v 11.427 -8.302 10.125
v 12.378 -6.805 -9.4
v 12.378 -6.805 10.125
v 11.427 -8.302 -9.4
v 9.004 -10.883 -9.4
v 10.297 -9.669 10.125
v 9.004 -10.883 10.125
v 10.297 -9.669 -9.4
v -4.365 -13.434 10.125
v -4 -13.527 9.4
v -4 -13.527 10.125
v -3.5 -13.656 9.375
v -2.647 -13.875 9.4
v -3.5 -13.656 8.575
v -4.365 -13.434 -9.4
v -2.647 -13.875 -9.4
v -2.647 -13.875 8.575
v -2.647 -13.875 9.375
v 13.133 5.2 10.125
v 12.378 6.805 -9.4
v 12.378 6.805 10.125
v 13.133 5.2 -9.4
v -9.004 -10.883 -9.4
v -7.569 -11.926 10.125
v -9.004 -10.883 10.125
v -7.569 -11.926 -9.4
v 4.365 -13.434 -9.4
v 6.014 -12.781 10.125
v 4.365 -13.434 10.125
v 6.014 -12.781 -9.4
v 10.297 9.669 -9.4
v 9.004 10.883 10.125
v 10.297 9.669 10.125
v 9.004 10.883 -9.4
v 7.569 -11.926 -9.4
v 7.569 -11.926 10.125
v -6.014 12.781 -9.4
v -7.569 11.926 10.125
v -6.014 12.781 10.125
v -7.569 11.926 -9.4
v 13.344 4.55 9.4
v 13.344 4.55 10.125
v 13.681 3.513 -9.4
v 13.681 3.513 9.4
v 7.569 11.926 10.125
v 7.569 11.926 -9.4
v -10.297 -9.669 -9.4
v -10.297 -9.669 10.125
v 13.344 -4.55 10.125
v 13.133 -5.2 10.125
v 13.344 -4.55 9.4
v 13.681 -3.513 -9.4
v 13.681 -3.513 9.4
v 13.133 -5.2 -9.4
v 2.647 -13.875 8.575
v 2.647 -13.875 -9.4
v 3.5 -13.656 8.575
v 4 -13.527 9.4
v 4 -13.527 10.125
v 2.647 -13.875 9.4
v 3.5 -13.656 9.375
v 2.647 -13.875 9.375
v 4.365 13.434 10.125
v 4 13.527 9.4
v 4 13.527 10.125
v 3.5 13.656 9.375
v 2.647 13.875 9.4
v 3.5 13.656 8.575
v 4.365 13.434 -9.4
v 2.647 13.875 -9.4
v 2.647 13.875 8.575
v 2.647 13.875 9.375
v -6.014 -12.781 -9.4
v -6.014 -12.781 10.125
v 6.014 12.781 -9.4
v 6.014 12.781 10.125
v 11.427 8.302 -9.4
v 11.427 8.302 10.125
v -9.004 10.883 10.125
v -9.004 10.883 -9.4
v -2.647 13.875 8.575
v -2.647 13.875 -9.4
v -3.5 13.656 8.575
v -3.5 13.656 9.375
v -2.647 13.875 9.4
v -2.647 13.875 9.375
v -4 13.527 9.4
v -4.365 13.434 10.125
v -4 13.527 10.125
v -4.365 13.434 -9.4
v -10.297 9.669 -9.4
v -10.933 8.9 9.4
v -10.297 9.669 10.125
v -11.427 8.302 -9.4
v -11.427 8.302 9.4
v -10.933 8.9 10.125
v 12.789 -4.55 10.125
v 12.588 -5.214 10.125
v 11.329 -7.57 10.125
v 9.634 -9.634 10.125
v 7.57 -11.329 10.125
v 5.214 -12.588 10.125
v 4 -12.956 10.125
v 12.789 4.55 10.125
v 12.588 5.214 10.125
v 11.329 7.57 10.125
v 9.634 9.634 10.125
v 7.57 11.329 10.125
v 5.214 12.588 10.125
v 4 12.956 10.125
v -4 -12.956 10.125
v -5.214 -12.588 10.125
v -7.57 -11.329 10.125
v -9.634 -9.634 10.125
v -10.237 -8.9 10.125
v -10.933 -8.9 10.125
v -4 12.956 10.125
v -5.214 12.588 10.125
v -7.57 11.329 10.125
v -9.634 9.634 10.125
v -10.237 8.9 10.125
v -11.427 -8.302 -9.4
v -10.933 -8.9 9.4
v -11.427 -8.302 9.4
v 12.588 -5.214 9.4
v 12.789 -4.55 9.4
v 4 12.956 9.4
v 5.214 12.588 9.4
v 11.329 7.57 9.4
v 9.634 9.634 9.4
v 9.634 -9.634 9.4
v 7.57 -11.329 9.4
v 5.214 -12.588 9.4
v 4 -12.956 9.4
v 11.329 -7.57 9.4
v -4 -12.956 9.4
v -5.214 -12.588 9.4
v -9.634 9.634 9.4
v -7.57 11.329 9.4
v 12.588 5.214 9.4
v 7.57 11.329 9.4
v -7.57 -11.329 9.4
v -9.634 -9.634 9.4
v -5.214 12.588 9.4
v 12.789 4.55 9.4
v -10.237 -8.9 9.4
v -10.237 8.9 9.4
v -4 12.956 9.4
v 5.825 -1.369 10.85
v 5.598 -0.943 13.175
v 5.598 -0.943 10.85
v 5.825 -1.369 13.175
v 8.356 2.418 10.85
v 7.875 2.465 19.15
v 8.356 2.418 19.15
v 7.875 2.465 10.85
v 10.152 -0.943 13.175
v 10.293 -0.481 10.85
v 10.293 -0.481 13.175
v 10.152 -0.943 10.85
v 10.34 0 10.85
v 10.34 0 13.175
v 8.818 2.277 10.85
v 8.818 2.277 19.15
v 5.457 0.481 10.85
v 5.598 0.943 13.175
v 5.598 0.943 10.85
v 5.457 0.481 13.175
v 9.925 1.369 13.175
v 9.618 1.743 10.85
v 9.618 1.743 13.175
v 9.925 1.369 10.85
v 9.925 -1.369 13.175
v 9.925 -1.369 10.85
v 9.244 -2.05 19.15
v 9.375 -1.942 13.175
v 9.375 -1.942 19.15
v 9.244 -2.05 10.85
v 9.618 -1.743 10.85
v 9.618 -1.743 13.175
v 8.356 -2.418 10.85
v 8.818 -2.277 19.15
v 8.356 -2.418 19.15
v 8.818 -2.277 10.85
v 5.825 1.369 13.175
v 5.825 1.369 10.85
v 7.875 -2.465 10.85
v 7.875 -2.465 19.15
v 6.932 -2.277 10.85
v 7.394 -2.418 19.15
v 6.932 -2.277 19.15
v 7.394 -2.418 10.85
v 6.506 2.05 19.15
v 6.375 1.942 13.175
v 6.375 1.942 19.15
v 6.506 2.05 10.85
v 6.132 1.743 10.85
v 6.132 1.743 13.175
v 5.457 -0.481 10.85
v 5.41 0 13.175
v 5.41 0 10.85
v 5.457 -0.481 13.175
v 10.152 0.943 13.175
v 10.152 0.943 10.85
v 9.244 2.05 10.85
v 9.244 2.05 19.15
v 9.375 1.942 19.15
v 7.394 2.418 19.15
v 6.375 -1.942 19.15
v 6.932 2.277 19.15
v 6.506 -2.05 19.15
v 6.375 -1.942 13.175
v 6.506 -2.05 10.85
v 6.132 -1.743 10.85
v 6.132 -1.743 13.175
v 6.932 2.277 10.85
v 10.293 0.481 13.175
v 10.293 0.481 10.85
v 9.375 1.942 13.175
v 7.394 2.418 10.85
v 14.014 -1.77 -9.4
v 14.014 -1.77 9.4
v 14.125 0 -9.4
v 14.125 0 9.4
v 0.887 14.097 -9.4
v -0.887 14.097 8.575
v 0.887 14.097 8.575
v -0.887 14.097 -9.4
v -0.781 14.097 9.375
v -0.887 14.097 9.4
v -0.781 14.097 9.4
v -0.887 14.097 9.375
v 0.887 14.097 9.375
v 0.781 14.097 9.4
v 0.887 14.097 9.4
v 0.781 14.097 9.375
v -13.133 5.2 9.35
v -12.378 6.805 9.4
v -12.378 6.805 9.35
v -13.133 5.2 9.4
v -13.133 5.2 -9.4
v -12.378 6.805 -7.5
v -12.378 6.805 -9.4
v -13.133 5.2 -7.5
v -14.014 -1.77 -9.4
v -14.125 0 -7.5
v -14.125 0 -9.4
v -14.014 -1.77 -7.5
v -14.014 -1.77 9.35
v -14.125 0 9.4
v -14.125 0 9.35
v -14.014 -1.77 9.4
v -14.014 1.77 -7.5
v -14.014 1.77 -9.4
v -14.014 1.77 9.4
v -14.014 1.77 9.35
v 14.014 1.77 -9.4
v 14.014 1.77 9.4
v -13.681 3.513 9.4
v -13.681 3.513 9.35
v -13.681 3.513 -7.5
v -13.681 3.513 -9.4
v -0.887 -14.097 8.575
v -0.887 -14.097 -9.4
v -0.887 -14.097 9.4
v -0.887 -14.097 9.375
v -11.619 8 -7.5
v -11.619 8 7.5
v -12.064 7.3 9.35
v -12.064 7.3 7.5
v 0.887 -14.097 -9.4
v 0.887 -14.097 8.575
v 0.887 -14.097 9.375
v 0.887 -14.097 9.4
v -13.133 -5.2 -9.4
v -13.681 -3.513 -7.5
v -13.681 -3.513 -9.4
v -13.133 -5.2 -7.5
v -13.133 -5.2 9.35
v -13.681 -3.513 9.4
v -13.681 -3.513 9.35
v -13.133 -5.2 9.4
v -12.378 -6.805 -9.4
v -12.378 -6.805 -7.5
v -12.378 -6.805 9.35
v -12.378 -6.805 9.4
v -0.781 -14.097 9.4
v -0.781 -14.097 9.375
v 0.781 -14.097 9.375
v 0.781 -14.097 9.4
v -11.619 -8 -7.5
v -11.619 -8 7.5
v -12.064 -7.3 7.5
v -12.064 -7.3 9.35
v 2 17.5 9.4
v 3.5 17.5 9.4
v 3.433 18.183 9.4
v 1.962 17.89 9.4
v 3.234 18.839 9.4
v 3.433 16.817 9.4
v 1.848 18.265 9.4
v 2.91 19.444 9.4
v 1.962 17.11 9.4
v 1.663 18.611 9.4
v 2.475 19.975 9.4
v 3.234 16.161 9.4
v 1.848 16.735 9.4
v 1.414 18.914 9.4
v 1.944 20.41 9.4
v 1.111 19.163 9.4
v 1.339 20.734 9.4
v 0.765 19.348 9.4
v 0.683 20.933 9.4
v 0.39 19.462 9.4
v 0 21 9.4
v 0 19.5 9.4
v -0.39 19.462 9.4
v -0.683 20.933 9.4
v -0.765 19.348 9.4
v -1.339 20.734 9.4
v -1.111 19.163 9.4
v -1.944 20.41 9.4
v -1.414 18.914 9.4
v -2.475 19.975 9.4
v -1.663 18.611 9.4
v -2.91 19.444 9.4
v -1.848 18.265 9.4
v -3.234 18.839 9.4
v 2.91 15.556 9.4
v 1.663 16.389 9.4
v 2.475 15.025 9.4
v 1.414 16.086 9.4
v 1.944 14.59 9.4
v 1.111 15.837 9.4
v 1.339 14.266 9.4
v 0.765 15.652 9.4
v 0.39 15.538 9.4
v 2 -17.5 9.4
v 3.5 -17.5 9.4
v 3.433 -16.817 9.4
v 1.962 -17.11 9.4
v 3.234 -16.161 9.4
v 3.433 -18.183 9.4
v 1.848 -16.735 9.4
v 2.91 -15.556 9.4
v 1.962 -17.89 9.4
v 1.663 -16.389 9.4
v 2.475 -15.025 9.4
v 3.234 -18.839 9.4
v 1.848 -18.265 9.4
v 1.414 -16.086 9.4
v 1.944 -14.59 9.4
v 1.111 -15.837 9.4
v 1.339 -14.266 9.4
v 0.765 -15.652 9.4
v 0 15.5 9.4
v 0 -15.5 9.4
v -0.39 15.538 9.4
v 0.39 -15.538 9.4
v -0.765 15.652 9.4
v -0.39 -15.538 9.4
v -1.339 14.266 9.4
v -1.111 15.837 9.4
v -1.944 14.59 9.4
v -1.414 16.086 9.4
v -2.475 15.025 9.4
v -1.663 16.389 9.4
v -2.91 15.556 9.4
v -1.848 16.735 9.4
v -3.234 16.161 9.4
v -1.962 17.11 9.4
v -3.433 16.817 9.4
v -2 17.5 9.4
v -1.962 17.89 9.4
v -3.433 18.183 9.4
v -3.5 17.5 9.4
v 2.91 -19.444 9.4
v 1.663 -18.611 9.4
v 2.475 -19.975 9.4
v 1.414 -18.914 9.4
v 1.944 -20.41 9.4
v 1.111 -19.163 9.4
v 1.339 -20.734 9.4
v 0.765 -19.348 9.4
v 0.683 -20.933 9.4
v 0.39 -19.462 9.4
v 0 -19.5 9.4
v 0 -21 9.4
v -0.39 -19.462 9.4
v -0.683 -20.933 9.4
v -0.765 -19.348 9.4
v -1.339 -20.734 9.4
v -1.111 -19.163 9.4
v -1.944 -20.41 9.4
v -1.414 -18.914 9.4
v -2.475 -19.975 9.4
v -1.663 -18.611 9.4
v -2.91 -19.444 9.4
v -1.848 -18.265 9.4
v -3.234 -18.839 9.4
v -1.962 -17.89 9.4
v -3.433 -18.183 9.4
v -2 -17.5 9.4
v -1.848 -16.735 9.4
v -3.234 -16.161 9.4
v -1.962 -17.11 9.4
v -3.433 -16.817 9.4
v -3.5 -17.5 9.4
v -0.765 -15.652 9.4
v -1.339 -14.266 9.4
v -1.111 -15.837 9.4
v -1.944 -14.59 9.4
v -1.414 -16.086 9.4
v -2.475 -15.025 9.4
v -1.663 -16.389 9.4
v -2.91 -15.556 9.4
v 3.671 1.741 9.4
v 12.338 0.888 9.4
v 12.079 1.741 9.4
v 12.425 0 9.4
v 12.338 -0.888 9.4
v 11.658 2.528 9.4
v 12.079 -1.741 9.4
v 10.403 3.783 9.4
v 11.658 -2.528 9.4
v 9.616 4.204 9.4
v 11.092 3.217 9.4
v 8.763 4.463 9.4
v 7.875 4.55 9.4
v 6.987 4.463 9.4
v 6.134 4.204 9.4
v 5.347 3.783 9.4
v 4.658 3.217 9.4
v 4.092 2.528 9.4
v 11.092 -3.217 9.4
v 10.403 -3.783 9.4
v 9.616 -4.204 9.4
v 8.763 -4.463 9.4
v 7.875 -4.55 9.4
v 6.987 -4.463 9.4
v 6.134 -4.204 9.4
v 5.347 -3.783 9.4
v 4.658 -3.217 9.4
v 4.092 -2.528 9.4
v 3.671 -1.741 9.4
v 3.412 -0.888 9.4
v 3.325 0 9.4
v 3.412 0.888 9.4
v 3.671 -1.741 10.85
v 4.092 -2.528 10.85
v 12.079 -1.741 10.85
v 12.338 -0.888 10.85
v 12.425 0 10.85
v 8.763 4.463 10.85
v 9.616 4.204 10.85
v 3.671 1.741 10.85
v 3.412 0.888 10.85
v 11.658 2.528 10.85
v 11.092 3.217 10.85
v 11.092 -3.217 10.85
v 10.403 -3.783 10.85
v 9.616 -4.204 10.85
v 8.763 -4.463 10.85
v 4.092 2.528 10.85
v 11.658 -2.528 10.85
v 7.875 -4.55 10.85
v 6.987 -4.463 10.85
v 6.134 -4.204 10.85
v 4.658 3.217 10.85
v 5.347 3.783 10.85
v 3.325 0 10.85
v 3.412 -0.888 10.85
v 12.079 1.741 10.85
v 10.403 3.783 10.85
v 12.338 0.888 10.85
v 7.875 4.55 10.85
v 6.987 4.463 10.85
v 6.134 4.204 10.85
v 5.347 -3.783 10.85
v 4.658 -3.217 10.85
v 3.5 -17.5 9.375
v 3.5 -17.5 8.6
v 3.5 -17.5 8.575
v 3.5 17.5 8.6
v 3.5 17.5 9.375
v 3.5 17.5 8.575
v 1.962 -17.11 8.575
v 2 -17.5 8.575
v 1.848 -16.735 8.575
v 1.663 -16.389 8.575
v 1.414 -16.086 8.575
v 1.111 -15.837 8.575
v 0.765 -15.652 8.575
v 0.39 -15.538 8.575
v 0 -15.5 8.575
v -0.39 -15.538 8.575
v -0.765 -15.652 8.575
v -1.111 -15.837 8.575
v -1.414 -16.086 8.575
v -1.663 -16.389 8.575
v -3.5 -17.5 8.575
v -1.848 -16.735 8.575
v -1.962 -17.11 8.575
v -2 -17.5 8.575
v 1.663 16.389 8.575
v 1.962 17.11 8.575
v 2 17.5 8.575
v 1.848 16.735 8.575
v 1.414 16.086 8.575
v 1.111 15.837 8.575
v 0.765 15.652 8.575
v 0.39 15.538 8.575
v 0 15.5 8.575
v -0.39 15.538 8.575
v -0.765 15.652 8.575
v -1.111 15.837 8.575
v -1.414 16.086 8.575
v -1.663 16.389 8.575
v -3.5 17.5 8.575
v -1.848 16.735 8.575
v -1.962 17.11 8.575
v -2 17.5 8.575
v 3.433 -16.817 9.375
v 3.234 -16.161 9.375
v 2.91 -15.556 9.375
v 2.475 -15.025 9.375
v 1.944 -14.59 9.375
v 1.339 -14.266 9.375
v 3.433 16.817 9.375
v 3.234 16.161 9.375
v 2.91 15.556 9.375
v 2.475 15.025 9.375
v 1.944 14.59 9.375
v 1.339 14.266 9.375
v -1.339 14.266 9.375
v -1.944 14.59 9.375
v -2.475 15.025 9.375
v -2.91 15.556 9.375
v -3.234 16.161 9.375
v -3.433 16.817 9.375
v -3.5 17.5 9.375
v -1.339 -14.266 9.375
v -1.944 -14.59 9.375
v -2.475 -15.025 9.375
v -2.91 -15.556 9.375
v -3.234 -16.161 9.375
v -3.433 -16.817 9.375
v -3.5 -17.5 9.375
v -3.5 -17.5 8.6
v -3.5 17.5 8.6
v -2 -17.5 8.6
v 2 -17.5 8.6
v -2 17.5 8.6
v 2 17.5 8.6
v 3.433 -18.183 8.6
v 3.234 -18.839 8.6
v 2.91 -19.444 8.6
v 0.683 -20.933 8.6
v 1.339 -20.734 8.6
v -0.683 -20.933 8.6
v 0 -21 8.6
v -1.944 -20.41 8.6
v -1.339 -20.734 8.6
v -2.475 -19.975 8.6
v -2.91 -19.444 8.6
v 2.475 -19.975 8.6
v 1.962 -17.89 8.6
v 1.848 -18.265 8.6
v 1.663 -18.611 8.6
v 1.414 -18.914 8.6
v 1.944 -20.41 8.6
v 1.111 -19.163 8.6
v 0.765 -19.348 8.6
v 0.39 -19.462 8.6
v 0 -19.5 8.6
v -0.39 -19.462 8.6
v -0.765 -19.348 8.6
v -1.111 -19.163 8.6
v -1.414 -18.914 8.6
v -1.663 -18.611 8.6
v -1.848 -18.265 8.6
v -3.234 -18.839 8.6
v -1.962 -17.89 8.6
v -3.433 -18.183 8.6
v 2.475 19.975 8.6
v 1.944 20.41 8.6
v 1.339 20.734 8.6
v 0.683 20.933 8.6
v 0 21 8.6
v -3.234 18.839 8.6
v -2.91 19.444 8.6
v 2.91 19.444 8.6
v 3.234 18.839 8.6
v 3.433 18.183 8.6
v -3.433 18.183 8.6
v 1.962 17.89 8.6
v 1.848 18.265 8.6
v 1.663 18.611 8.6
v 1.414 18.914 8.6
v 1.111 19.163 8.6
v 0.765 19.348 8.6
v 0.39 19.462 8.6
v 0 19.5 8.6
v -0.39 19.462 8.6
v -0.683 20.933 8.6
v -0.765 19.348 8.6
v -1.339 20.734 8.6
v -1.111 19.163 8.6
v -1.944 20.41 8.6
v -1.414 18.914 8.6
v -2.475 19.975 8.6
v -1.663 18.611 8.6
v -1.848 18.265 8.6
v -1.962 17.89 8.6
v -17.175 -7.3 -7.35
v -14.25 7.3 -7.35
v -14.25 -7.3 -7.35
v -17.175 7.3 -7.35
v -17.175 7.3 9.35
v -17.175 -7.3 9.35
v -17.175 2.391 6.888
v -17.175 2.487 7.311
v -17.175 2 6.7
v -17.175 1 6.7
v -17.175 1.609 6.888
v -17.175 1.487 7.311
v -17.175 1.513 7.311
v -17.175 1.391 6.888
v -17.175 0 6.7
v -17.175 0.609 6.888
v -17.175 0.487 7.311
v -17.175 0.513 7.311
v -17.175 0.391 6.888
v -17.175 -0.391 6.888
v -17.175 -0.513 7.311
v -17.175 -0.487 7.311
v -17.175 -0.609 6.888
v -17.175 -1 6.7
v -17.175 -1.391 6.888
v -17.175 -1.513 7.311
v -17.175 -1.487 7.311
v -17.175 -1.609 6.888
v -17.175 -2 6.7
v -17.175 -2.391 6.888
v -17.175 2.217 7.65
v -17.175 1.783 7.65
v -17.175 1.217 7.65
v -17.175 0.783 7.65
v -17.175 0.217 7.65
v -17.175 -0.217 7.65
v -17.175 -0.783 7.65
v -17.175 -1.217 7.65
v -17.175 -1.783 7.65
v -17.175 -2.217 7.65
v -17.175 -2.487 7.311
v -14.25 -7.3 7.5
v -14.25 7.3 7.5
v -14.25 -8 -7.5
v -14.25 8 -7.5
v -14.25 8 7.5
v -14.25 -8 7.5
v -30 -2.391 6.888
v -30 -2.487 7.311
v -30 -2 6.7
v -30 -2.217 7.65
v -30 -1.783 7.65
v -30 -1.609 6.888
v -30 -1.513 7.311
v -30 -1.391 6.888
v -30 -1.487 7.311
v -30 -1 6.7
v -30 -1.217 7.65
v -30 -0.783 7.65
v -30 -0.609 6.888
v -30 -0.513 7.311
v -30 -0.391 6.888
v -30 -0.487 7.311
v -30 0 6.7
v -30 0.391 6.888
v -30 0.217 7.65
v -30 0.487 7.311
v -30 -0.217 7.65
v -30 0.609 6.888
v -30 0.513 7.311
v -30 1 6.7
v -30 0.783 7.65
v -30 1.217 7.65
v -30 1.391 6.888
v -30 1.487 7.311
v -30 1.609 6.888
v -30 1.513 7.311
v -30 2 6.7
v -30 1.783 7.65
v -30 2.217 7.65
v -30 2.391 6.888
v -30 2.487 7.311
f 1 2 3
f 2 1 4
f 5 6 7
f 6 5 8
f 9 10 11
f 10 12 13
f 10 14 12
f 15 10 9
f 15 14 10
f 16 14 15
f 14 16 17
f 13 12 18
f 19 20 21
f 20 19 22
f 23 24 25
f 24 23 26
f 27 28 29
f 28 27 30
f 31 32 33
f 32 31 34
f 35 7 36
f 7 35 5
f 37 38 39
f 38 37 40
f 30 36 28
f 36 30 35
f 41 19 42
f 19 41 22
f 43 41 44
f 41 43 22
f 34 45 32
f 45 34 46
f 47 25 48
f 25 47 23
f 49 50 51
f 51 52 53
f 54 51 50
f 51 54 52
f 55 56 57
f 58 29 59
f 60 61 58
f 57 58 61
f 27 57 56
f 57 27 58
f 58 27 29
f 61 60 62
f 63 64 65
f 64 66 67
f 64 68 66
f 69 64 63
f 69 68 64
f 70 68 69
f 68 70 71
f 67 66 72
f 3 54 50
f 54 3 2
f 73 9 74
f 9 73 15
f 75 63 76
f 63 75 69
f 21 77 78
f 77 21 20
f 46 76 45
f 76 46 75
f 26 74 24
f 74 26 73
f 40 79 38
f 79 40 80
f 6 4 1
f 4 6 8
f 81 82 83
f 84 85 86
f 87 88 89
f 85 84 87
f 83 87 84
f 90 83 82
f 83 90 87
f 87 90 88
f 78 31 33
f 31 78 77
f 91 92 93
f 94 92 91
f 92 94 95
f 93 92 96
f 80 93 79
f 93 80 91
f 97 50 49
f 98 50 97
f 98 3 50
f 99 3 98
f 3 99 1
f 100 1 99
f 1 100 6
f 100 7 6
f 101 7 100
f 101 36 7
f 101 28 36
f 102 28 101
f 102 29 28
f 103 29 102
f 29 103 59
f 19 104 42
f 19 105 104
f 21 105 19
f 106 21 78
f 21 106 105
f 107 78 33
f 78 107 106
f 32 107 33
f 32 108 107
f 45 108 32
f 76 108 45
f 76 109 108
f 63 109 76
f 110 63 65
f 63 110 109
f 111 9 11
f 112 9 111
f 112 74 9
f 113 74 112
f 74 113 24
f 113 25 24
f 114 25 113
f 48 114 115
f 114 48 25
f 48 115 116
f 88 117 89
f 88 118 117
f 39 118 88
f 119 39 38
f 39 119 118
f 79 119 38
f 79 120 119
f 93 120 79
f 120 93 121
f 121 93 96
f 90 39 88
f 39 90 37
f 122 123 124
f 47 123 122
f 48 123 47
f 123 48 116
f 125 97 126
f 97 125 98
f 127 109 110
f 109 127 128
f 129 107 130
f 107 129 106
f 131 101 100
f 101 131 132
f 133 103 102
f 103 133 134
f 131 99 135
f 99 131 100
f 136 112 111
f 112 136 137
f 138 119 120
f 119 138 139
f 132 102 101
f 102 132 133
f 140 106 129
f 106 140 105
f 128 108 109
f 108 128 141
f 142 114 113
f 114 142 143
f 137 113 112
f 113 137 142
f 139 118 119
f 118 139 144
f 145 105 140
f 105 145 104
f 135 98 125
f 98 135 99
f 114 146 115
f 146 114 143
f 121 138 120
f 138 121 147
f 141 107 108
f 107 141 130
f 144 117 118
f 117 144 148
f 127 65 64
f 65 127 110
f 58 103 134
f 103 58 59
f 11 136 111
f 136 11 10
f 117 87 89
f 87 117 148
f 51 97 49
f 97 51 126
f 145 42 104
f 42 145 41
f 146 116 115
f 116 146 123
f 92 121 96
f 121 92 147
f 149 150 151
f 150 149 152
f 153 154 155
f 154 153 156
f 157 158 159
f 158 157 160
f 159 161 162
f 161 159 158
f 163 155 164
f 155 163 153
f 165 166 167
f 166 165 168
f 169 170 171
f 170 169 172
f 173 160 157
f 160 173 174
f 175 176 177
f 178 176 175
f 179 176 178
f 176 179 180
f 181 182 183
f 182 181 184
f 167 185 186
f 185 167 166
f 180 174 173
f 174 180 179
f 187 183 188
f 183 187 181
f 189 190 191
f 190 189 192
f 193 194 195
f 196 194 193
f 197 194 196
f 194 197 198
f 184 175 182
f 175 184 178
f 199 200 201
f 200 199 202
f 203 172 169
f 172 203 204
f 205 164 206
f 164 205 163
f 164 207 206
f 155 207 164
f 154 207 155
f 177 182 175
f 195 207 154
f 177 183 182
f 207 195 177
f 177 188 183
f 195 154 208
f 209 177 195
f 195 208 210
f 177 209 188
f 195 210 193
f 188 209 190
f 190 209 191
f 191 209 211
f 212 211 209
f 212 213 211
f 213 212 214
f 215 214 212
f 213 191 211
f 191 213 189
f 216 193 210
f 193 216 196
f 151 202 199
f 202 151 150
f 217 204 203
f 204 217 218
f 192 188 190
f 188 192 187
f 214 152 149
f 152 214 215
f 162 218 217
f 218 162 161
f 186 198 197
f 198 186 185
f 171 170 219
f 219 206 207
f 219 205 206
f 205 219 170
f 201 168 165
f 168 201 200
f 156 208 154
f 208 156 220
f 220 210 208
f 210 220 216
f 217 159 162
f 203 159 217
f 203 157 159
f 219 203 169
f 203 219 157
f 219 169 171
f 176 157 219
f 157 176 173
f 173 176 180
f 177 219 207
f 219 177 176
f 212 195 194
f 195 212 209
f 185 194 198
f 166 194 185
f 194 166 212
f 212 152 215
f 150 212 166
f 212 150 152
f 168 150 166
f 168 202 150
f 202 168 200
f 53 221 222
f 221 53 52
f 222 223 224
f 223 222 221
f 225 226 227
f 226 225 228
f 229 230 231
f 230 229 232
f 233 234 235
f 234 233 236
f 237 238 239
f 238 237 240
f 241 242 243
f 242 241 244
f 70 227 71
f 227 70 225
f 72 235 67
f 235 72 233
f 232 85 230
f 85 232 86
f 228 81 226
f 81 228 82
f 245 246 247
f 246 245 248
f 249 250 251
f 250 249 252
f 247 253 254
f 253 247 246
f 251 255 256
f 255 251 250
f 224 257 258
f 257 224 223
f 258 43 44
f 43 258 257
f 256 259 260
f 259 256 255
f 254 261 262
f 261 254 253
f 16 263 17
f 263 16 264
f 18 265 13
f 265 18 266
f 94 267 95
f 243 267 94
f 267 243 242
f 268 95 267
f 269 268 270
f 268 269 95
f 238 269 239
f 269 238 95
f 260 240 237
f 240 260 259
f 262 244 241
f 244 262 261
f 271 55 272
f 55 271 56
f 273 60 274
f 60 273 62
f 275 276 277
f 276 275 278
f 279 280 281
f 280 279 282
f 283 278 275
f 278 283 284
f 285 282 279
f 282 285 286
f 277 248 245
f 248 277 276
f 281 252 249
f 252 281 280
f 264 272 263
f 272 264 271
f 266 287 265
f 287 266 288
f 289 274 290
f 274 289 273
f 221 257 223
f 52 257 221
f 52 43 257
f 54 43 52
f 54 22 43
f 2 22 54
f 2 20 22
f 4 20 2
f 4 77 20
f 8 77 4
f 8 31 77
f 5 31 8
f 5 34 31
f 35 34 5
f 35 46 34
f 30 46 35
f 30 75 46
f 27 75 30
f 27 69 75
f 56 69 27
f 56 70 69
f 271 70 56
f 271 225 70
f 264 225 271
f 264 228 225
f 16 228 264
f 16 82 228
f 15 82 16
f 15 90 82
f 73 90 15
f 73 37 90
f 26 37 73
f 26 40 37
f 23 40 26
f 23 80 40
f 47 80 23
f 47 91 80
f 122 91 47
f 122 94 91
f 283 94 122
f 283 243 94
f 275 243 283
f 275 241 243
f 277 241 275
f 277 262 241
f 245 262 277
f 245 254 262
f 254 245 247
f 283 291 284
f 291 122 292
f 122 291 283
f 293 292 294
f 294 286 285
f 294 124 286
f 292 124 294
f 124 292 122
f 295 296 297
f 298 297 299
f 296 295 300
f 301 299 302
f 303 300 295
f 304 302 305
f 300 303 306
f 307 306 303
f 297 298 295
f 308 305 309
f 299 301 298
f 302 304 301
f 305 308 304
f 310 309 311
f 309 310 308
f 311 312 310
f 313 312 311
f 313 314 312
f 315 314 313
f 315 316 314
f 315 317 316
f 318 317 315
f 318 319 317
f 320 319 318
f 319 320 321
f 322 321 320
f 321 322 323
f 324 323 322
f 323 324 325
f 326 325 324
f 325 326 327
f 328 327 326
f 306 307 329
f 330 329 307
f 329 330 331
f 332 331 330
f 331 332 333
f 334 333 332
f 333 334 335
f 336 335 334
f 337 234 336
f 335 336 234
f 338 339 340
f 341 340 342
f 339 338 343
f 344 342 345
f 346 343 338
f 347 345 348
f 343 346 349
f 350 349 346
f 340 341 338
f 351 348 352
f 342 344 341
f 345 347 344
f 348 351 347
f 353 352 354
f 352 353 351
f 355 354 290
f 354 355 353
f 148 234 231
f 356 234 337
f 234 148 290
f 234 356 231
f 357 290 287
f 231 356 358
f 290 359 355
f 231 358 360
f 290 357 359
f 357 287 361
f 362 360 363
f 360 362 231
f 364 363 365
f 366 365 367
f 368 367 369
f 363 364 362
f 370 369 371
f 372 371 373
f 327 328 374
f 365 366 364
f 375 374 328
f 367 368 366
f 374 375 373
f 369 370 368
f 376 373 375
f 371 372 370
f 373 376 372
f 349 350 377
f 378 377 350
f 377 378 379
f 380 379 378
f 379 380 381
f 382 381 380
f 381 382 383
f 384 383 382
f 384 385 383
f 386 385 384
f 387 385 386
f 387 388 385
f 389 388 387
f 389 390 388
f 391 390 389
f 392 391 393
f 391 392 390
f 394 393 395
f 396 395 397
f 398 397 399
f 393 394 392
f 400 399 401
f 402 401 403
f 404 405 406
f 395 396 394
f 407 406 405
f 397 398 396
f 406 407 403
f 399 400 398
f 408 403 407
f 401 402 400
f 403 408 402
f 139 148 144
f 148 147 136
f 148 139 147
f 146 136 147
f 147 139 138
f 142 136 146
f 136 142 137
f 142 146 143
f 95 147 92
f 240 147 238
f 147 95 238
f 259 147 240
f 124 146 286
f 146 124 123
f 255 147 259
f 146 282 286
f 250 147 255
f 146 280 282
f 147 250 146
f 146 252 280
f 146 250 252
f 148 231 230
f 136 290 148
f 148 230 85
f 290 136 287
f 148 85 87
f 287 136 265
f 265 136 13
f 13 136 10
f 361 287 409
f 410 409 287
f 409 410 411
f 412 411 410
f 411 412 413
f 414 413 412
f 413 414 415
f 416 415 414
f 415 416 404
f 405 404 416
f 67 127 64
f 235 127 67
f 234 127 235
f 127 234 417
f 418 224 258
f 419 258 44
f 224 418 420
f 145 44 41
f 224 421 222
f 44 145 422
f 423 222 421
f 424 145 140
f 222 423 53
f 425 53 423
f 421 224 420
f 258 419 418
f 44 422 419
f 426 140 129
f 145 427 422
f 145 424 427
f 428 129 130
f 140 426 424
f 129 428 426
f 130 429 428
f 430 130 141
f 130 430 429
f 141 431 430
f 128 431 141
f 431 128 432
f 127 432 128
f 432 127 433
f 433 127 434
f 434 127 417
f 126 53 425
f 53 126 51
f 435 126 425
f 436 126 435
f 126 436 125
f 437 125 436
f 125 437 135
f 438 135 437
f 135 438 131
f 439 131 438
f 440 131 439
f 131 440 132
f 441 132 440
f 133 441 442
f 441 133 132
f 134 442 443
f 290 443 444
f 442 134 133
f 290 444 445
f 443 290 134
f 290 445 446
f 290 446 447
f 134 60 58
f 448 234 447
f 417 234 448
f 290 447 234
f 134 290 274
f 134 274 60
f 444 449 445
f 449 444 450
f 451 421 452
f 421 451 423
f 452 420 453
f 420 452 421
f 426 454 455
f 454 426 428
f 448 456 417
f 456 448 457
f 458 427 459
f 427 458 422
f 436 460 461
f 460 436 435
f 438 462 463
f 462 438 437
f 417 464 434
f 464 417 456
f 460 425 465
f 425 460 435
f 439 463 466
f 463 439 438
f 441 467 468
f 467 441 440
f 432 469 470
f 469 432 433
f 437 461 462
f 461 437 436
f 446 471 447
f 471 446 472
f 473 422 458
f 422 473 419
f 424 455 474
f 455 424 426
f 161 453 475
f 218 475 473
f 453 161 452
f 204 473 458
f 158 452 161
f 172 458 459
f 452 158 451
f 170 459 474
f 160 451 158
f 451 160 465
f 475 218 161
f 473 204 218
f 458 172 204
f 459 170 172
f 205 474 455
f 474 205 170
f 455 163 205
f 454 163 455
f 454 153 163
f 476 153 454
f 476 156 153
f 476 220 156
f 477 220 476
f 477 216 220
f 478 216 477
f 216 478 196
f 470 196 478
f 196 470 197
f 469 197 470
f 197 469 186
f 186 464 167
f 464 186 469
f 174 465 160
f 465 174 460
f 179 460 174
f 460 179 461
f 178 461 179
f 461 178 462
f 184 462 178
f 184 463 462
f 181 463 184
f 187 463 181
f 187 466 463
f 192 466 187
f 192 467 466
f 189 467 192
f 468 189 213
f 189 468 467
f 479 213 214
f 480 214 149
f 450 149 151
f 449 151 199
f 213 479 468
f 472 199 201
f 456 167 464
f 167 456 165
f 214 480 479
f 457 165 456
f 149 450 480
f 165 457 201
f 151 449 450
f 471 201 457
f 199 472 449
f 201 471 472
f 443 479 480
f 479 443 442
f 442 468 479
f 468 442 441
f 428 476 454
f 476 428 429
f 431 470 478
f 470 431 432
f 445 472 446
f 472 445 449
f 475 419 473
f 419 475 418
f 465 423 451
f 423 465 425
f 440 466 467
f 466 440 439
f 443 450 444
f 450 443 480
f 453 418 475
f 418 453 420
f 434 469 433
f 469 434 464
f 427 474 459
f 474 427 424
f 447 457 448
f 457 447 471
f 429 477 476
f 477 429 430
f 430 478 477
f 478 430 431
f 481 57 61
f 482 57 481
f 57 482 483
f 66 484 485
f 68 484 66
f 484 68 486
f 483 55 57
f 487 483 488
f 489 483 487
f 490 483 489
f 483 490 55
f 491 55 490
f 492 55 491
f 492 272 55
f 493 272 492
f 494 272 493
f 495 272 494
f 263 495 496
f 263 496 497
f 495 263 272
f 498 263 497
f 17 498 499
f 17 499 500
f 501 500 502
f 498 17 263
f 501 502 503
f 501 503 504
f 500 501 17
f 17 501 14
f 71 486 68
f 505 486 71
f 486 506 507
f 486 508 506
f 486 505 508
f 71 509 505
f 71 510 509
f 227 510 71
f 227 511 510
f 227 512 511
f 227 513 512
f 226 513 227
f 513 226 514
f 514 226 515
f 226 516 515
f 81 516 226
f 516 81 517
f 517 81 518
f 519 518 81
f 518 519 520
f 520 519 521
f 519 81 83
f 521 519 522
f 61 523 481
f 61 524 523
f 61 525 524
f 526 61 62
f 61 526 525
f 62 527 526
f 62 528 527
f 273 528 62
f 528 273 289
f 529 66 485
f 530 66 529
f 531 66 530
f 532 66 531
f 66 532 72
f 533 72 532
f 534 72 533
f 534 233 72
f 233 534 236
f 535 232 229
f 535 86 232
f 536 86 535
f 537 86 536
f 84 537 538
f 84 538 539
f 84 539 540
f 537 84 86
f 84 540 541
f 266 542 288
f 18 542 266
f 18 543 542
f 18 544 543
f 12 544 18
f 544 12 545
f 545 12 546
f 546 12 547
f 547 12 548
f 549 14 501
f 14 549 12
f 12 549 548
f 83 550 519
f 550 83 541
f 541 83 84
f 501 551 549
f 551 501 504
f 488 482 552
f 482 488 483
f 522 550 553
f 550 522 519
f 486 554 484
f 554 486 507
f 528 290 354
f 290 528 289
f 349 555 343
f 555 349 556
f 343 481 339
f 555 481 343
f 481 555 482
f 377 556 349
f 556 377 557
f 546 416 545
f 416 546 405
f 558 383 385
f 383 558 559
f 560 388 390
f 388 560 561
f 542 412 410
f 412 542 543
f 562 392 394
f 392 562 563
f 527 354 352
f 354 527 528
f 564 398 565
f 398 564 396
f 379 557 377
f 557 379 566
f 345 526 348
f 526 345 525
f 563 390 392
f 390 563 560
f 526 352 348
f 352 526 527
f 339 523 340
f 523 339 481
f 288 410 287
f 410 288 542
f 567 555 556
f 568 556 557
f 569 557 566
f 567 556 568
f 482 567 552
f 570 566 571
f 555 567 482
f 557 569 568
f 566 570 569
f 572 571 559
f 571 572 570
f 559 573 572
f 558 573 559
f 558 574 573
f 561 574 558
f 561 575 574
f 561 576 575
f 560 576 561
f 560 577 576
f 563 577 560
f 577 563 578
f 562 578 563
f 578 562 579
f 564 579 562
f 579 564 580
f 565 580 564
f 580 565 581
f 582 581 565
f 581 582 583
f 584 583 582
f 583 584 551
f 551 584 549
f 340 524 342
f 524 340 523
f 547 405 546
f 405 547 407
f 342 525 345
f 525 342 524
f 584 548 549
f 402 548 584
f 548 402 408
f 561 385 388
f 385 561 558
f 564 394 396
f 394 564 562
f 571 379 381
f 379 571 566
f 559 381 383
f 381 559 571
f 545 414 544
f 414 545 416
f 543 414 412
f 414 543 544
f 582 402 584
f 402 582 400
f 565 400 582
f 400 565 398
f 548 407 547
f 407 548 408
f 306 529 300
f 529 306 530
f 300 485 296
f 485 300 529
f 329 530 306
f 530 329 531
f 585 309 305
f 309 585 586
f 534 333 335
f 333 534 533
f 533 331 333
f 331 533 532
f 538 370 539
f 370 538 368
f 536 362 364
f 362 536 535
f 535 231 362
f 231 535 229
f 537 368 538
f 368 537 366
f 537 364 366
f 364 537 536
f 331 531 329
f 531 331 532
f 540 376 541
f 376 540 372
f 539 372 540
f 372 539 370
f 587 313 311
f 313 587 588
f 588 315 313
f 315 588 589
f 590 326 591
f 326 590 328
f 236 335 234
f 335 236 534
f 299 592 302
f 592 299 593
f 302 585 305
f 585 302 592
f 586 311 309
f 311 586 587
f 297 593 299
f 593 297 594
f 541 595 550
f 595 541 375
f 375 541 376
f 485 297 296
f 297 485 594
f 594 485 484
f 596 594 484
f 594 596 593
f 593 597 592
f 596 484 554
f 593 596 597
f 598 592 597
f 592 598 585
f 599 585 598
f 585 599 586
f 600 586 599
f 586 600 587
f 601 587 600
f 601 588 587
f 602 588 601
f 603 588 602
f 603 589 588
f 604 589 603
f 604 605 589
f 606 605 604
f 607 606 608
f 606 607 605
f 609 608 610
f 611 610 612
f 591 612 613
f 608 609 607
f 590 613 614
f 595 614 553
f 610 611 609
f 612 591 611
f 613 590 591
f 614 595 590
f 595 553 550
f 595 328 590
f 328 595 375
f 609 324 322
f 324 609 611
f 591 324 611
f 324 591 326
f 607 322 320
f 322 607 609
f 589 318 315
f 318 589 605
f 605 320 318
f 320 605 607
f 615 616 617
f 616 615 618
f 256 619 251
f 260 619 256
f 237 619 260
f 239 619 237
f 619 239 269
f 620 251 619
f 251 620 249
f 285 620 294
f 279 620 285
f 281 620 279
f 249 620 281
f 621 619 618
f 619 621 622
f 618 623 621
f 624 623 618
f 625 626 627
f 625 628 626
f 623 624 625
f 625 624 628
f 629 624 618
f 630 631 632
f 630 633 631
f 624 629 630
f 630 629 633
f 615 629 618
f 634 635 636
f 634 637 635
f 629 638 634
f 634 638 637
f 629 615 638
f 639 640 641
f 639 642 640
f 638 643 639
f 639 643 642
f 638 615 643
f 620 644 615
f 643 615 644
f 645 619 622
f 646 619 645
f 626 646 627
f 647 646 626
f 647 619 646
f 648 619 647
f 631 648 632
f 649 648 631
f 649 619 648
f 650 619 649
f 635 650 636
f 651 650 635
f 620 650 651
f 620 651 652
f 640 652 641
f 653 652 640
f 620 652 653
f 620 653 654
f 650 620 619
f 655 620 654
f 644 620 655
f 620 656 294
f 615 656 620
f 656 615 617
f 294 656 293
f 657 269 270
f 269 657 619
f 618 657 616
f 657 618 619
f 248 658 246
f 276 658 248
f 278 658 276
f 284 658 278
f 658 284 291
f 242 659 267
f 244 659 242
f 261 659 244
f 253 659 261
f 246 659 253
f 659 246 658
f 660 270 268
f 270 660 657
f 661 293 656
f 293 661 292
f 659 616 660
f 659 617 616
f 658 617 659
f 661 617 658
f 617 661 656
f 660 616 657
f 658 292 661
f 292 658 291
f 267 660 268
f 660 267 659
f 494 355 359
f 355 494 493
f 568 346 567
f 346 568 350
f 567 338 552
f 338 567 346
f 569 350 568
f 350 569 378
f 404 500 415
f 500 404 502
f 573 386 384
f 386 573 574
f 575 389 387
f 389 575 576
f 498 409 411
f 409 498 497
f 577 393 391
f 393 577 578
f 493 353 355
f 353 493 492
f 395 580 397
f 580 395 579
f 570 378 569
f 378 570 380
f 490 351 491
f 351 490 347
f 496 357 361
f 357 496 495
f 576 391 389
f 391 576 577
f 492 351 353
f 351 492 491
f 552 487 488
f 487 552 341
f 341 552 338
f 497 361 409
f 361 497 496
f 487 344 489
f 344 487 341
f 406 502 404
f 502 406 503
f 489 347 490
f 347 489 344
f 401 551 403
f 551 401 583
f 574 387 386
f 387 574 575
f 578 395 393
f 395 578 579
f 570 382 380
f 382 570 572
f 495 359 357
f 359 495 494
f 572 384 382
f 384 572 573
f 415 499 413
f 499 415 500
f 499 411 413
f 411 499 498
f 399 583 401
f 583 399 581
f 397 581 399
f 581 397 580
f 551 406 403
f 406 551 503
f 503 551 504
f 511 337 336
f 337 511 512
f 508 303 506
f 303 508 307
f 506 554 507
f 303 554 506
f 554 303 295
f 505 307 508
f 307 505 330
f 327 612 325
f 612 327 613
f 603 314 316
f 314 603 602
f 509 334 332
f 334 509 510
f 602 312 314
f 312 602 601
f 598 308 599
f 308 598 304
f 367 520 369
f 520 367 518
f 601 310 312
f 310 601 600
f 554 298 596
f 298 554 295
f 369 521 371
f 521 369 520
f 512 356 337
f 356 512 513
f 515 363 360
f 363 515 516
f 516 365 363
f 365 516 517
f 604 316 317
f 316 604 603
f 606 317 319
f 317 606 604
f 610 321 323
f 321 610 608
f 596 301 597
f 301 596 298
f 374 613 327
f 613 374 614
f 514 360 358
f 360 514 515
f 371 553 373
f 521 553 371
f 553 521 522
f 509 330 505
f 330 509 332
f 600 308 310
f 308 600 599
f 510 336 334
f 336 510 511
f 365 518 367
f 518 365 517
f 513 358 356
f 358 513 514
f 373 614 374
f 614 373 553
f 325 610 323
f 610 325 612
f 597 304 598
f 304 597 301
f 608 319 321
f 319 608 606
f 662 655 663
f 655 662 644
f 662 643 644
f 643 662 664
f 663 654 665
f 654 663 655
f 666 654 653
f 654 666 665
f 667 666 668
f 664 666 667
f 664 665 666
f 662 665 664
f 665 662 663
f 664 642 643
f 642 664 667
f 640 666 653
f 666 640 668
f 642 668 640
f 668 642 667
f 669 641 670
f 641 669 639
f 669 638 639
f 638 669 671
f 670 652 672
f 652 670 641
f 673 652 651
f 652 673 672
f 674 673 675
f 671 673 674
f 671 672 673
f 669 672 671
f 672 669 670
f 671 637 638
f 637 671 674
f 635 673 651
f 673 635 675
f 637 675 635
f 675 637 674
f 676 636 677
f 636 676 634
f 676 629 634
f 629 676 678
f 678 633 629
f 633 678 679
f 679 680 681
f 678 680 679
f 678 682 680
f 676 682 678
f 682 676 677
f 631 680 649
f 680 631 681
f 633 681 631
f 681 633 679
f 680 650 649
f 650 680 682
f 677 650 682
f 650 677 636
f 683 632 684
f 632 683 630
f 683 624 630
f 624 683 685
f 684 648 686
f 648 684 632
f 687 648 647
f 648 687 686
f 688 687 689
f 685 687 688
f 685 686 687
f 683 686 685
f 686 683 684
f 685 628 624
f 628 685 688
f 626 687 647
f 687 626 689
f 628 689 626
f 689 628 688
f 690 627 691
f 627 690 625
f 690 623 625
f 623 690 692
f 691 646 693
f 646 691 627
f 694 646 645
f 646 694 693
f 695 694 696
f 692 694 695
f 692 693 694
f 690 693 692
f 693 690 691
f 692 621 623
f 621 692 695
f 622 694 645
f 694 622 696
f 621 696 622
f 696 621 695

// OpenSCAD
// 28BYJ-48 from RGriffoGoes 
// at http://www.thingiverse.com/thing:204734
// named and measured dimensions, and
// added details by J.Beale 21 July 2014

MBH = 18.8;   // motor body height
MBD = 28.25;  // motor body OD
SBD = 9.1;    // shaft boss OD
SBH = 1.45;   // shaft boss height above motor body
SBO = 7.875;  // offset of shaft/boss center from motor center
SHD = 4.93;   // motor shaft OD
SHDF = 3.0;   // motor shaft diameter, across flats
SHHF = 6.0;   // motor shaft flats height, or depth in from end
SHH = 9.75;   // height of shaft above motor body 

MBFH = 0.7;   // height of body edge flange protruding above surface
MBFW = 1.0;   // width of edge flange
MBFNW = 8;    // width of notch in edge flange
MBFNW2 = 17.8;  // width of edge flange notch above wiring box

MHCC = 35.0;  // mounting hole center-to-center
MTH  = 0.8;   // mounting tab thickness
MTW  = 7.0;   // mounting tab width
WBH  = 16.7;  // plastic wiring box height
WBW  = 14.6;  // plastic wiring box width
WBD  = 31.3;  // body diameter to outer surface of wiring box

WRD = 1.0;     // diameter of electrical wires
WRL = 30;      // length of electrical wires
WRO = 2.2;		// offset of wires below top motor surface

// =========================================================
eps = 0.05;   // small number to avoid coincident faces


module wires() {
 
  color([0.9,0.9,0]) translate([0,WRD*2,0]) cylinder(h=WRL,r=WRD/2, $fn = 7);
  color([.9,.45,0]) translate([0,WRD*1,0]) cylinder(h=WRL,r=WRD/2, $fn = 7);   
  color([1,0,0]) translate([0,0,0]) cylinder(h=WRL,r=WRD/2, $fn = 7);
  color([1,.6,.6]) translate([0,-WRD*1,0]) cylinder(h=WRL,r=WRD/2, $fn = 7);
  color([.2,.2,1]) translate([0,-WRD*2,0]) cylinder(h=WRL,r=WRD/2, $fn = 7);
}

module StepMotor28BYJ()
{
  difference(){
    union(){
	   color("gray") translate([0,0,-(MBH+MBFH)/2])
		  difference() {  // flange at top rim
         cylinder(h = MBFH+eps, r = MBD/2, center = true, $fn = 50);
         cylinder(h = MBFH+2*eps, r = (MBD-MBFW)/2, center = true, $fn = 32);
			cube([MBFNW,MHCC,MBFH*2],center=true); // notches in rim
			cube([MBD+2*MBFW,SBD,MBFH*2],center=true);
		   translate([-MBD/2,0,0]) cube([MBD,MBFNW2,MBFH*2],center=true);
        }
		color("gray") // motor body
			cylinder(h = MBH, r = MBD/2, center = true, $fn = 50);
		color("gray") translate([SBO,0,-SBH])	// shaft boss
			cylinder(h = MBH, r = SBD/2, center = true, $fn = 32);

		translate([SBO,0,-SHH])	// motor shaft
        difference() {
			color("gold") cylinder(h = MBH, r = SHD/2, center = true, $fn = 32);
				// shaft flats
		   color("red") translate([(SHD+SHDF)/2,0,-(eps+MBH-SHHF)/2]) 
				cube([SHD,SHD,SHHF], center = true);
		   color("red") translate([-(SHD+SHDF)/2,0,-(eps+MBH-SHHF)/2]) 
				cube([SHD,SHD,SHHF], center = true);
        }


		color("Silver") translate([0,0,-(MBH-MTH-eps)/2]) // mounting tab 
			cube([MTW,MHCC,MTH], center = true);				
		color("Silver") translate([0,MHCC/2,-(MBH-MTH)/2]) // mt.tab rounded end
			cylinder(h = MTH, r = MTW/2, center = true, $fn = 32);
		color("Silver") translate([0,-MHCC/2,-(MBH-MTH)/2]) // mt.tab rounded end
			cylinder(h = MTH, r = MTW/2, center = true, $fn = 32);


		color("blue") translate([-(WBD-MBD),0,eps-(MBH-WBH)/2]) // plastic wire box
			cube([MBD,WBW,WBH], center = true);
	   color("blue") translate([-2,0,0])	
			cube([24.5,16,15], center = true);
		}

				// mounting holes in tabs on side
		color("red") translate([0,MHCC/2,-MBH/2])	
				cylinder(h = 2, r = 2, center = true, $fn = 32);
		color("red") translate([0,-MHCC/2,-MBH/2])	
				cylinder(h = 2, r = 2, center = true, $fn = 32);
		}
	}

rotate([180,0,0]) {

  StepMotor28BYJ();  // motor body (without wires)

  // 5 colored hookup wires
  translate([0,0,-(MBH/2 - WRO)]) rotate([0,-90,0])  
	  wires();
}
